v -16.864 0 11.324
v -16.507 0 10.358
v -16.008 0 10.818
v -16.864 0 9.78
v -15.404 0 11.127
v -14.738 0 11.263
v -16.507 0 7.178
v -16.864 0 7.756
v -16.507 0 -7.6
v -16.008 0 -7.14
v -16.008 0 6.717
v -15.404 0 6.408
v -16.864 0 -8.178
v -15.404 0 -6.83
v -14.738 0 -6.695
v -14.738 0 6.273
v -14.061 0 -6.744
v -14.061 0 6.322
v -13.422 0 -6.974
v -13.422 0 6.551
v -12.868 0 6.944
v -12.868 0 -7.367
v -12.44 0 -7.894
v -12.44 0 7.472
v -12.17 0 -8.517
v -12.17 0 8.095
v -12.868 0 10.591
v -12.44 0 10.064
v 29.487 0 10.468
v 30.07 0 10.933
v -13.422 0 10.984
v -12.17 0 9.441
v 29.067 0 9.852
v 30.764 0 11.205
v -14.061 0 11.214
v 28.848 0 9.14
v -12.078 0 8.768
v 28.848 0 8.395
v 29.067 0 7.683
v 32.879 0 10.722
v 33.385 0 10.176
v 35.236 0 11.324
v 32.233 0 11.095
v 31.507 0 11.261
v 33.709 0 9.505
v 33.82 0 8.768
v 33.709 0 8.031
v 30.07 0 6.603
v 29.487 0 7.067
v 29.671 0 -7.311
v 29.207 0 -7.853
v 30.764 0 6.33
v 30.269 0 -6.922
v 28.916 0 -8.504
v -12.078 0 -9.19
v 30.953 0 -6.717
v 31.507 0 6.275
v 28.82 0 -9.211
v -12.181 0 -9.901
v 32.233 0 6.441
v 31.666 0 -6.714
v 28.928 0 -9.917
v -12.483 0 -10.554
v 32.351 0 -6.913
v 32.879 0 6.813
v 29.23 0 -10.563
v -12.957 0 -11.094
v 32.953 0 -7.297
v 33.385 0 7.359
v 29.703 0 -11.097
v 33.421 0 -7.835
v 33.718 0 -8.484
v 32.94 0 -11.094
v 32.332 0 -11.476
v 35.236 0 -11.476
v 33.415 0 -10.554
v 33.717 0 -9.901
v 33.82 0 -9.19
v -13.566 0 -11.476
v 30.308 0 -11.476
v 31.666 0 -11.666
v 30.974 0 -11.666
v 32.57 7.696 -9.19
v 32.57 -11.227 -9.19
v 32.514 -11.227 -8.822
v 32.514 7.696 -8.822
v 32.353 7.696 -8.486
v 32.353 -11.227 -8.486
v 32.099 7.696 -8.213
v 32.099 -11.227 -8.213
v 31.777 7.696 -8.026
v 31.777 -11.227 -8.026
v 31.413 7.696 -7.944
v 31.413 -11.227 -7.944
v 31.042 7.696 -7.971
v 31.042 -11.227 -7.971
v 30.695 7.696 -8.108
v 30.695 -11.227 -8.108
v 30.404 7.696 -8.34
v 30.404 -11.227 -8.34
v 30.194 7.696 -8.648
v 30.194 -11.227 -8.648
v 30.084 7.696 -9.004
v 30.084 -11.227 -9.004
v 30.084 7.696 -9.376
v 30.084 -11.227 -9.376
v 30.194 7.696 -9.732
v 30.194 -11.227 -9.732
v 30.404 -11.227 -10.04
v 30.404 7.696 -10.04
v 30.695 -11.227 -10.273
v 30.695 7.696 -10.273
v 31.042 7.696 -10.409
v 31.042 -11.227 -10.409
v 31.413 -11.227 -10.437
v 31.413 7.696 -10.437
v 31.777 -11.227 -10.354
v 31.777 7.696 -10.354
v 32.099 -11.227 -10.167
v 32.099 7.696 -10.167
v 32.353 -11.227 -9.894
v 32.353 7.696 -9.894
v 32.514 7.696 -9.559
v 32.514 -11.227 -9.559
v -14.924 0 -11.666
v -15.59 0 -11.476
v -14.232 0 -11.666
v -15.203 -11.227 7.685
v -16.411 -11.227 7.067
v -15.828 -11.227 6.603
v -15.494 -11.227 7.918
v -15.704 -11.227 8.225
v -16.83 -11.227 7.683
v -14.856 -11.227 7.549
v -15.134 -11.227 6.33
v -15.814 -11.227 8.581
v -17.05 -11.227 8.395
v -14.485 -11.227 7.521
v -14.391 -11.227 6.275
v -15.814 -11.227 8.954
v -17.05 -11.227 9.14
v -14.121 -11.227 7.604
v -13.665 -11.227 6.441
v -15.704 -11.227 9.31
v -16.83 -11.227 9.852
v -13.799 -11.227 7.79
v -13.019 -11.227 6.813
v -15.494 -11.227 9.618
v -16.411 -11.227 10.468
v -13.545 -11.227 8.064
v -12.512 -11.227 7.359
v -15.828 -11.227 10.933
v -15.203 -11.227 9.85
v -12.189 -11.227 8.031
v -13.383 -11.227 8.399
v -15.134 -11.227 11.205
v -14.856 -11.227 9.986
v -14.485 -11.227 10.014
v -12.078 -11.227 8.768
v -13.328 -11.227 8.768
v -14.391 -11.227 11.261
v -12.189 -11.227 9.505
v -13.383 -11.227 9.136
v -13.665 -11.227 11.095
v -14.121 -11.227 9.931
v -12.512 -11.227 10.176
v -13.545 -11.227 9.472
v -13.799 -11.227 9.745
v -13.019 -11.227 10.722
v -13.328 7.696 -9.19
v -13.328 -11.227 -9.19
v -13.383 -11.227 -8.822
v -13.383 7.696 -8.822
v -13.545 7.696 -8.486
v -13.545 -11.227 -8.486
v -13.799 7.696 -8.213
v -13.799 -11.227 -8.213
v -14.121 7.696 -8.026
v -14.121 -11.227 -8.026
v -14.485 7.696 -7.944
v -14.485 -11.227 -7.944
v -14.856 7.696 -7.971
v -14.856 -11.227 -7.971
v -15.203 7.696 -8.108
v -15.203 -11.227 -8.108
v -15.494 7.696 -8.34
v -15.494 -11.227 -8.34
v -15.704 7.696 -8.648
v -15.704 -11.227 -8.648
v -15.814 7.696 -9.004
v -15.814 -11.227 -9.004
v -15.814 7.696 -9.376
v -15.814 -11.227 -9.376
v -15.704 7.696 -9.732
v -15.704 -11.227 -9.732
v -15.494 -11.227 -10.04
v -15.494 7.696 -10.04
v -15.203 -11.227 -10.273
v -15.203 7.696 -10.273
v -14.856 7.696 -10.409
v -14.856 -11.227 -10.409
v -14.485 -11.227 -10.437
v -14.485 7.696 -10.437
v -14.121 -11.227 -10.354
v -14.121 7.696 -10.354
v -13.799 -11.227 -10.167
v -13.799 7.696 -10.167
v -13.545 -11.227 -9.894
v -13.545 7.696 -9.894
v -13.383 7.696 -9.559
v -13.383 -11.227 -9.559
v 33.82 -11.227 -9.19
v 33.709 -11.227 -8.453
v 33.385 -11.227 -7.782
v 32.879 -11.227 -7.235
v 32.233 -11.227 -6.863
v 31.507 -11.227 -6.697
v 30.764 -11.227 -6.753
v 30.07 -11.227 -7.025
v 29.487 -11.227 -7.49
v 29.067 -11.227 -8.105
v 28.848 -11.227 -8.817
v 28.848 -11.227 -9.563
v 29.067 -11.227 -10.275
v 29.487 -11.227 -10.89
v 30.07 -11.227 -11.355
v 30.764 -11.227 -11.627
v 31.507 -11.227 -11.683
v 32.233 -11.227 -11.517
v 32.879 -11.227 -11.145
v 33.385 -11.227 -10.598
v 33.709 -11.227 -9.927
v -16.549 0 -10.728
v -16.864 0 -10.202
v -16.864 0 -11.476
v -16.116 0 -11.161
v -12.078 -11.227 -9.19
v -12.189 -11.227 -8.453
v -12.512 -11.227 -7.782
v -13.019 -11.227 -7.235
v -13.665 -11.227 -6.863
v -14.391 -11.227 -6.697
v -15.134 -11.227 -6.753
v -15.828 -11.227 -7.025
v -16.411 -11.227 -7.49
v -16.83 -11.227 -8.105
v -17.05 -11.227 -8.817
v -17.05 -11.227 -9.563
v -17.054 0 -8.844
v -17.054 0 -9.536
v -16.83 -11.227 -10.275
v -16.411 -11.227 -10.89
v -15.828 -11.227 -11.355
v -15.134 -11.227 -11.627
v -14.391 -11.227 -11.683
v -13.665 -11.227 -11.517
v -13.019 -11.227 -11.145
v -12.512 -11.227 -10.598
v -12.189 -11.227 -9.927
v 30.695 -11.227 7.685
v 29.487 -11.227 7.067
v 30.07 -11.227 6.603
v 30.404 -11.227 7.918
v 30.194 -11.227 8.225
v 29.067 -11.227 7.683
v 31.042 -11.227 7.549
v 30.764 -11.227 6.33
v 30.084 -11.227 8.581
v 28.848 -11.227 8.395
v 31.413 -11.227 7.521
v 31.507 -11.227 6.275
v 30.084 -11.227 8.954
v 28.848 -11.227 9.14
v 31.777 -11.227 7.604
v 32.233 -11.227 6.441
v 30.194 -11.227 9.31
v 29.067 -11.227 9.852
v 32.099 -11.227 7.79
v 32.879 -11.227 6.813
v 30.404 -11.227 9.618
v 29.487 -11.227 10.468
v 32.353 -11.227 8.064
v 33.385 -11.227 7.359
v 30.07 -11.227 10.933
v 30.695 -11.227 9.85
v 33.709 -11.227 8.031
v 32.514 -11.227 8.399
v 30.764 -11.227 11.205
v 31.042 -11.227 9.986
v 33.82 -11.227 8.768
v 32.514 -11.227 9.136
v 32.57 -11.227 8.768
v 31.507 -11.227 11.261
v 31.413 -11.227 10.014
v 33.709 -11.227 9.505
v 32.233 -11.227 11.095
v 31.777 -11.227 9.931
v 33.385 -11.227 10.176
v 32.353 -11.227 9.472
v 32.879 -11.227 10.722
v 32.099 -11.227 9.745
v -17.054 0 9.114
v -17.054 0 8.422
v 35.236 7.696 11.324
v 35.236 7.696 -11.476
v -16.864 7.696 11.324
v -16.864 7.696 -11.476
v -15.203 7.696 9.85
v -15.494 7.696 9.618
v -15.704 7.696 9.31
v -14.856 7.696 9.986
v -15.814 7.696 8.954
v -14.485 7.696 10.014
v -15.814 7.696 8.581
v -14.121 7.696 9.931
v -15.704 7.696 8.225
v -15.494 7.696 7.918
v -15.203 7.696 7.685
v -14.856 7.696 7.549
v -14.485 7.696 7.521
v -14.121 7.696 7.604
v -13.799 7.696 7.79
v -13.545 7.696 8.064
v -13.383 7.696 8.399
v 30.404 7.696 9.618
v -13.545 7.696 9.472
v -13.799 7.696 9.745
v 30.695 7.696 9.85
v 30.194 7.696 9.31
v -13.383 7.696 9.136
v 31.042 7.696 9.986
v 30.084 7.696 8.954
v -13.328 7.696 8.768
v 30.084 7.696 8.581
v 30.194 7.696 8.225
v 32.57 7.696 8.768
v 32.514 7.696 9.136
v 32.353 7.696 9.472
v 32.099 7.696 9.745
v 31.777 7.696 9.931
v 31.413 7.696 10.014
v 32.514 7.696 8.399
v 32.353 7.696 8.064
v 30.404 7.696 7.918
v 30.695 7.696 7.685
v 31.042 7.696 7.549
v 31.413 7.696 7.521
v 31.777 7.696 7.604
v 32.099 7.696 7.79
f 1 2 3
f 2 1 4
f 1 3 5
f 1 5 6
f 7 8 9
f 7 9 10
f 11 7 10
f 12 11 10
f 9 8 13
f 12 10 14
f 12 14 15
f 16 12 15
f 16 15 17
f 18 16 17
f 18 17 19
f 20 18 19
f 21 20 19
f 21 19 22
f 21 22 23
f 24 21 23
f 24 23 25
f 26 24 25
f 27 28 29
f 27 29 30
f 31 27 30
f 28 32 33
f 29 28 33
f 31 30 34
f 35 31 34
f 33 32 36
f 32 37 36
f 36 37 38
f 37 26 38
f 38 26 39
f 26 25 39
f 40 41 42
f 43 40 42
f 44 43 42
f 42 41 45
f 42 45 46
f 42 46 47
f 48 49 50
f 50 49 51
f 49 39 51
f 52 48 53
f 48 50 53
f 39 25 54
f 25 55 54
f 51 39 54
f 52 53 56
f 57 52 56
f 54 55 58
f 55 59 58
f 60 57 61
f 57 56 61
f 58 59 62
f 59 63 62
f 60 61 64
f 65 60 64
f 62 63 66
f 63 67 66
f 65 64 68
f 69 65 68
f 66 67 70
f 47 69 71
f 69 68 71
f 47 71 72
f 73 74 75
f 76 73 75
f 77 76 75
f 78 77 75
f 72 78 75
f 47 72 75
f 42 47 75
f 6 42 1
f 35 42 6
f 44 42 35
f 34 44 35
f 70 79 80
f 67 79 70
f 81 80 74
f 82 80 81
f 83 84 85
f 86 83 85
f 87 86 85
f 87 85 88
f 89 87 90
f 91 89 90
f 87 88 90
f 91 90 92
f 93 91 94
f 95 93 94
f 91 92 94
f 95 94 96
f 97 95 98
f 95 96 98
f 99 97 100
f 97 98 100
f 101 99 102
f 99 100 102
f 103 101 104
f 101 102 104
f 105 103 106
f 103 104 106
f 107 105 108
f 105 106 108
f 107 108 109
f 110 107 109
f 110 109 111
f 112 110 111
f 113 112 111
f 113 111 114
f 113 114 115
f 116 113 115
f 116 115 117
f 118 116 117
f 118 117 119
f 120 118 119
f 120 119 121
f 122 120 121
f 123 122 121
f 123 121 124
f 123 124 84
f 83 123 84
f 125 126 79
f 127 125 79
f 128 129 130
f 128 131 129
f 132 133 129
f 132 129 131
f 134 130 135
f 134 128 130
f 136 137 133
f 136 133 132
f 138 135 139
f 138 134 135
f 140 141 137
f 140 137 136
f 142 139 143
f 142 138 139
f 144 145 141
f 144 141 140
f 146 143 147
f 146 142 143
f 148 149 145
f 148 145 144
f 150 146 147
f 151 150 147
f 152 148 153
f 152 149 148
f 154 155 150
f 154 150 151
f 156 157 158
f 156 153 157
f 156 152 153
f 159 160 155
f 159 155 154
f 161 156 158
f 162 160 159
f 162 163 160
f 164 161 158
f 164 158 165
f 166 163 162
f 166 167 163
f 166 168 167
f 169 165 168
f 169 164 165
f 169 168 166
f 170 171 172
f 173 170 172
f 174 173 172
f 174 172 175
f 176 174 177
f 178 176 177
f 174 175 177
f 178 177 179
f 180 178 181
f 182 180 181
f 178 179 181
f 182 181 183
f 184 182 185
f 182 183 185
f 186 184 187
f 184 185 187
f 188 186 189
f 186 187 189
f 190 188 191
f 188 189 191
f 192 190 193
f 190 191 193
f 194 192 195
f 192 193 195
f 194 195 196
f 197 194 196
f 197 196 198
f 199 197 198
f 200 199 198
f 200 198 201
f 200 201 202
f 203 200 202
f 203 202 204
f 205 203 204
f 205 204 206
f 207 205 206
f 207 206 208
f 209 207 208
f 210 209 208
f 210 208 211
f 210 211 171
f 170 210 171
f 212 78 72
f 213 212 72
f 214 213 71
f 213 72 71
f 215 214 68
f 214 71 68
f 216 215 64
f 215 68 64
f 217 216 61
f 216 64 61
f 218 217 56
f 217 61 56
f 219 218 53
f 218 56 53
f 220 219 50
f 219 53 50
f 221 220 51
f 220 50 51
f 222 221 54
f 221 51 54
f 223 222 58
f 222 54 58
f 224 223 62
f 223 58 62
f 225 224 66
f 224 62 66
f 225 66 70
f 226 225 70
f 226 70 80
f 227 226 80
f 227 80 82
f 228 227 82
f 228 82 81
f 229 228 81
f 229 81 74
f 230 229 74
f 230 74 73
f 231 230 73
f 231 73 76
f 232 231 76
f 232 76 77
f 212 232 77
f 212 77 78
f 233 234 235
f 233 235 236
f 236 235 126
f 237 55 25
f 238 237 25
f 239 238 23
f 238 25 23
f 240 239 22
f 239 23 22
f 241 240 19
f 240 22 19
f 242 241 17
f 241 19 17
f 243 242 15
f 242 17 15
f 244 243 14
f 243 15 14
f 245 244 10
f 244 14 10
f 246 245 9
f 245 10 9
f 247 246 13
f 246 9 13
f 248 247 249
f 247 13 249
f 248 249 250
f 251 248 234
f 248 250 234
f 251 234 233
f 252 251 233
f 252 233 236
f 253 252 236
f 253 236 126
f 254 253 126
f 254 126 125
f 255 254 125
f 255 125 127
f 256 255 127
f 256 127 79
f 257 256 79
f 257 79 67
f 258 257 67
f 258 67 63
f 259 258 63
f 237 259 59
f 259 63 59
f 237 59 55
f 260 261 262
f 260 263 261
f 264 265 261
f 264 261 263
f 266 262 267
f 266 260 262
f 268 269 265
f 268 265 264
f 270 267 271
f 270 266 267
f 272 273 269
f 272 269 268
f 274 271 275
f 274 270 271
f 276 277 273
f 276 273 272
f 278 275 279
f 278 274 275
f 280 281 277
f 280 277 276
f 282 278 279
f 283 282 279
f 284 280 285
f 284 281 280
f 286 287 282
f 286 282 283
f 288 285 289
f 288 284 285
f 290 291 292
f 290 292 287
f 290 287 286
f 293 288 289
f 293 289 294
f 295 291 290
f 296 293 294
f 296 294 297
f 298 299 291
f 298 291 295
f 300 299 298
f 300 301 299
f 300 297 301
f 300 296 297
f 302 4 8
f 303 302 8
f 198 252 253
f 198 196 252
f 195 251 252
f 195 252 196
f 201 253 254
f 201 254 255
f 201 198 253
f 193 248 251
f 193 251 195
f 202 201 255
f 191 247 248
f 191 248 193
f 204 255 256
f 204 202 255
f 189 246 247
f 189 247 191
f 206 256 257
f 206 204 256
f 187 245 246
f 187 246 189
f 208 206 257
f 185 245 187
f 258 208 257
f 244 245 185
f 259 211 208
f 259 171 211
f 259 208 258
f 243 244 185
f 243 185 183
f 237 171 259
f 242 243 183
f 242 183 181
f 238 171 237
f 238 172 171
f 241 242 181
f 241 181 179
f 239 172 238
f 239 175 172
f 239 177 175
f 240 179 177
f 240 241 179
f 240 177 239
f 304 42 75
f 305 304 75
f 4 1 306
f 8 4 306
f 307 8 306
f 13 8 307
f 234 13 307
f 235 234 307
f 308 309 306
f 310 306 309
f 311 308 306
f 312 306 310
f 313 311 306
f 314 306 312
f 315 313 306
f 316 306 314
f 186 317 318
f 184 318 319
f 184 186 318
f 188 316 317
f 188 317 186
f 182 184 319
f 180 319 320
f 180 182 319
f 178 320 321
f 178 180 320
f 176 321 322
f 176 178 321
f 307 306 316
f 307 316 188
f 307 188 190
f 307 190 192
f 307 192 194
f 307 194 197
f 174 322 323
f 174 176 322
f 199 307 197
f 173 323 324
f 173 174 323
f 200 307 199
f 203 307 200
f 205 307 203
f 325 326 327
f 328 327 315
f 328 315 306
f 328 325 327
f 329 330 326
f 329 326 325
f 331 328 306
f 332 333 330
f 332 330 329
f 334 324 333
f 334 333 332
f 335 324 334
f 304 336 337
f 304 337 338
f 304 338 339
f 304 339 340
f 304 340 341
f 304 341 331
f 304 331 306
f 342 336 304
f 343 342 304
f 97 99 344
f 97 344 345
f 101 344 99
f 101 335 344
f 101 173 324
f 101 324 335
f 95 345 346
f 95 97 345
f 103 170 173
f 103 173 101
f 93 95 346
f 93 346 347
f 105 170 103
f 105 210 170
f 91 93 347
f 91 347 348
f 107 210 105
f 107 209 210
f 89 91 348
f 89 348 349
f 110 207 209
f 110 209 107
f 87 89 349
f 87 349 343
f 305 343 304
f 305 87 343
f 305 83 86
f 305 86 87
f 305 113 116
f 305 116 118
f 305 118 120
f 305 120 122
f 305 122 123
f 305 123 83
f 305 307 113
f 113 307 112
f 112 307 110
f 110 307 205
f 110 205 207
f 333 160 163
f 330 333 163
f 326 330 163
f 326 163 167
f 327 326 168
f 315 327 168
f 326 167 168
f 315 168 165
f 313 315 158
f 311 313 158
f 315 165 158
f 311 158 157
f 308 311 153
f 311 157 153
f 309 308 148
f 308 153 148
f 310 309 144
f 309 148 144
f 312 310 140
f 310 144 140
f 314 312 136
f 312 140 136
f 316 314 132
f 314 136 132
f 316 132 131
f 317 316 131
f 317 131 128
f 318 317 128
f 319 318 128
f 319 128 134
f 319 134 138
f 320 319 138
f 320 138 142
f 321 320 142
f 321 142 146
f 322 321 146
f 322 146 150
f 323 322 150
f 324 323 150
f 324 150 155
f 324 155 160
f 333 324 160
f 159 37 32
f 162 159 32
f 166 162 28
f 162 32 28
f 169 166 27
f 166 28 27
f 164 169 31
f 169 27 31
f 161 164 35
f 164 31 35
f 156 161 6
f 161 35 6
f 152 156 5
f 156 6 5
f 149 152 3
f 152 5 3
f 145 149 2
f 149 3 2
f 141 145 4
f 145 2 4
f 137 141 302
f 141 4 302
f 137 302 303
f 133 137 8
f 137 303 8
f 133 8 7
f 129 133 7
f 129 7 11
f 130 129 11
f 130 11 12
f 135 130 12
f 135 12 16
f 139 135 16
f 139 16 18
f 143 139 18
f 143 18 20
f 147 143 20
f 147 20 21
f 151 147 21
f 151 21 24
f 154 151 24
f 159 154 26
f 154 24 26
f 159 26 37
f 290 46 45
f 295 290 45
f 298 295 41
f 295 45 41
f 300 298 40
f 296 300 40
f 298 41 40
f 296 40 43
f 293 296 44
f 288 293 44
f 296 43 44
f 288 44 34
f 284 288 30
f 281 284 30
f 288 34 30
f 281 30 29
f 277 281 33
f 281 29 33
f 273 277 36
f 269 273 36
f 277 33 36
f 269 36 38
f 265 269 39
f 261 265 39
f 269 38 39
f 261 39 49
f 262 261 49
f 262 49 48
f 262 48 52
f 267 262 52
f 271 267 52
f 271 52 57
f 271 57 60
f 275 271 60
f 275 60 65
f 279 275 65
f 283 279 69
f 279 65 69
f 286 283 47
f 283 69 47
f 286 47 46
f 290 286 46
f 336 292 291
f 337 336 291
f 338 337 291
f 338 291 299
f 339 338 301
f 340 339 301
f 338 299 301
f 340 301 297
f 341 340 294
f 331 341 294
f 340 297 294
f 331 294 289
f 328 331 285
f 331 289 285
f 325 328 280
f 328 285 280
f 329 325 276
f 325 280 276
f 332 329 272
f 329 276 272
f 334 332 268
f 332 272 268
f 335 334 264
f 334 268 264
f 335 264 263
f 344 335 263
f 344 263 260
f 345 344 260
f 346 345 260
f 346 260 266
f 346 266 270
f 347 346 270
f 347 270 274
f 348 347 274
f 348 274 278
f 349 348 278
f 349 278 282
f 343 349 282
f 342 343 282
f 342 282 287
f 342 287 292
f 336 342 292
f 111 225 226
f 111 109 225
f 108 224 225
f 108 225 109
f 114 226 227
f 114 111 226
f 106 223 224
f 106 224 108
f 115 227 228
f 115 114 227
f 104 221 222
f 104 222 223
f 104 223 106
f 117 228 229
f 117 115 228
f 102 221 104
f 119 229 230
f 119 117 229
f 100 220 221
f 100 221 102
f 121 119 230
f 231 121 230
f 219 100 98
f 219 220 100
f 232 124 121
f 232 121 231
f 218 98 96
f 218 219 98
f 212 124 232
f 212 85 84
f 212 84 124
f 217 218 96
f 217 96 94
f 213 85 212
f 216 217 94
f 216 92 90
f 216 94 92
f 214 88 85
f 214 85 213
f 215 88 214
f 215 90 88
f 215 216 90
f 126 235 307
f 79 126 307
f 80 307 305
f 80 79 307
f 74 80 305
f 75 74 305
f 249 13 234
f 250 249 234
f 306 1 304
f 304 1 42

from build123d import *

# Parameters (mm, degrees)
SKETCH1_W           = 52.1
SKETCH1_H           = 22.8
BOSS_EXTRUDE1_DEPTH = 7.6962
SKETCH2_R           = 2.5
BOSS_EXTRUDE2_DEPTH = 11.2268
SKETCH3_R           = 1.25
CUT_EXTRUDE1_DEPTH  = 19.923


with BuildPart() as part:
    # Sketch1 → Boss-Extrude1 (new body)
    with BuildSketch(Plane(origin=(0, 0, 0), x_dir=(1, 0, 0), z_dir=(0, 1, 0))):
        with Locations((9.186055138, 0.076057393)):
            Rectangle(SKETCH1_W, SKETCH1_H)
    extrude(amount=BOSS_EXTRUDE1_DEPTH)

    # Sketch2 → Boss-Extrude2 (add)
    with BuildSketch(Plane.XZ):
        with Locations((-14.577944862, 8.767742607)):
            Circle(SKETCH2_R)
        with Locations((31.319855138, 8.767742607)):
            Circle(SKETCH2_R)
        with Locations((31.319855138, -9.190057393)):
            Circle(SKETCH2_R)
        with Locations((-14.577944862, -9.190057393)):
            Circle(SKETCH2_R)
    extrude(amount=BOSS_EXTRUDE2_DEPTH)

    # Sketch3 → Cut-Extrude1 (cut, through all)
    with BuildSketch(Plane.XZ.offset(11.2268)):
        with Locations((-14.577944862, 8.767742607)):
            Circle(SKETCH3_R)
        with Locations((-14.577944862, -9.190057393)):
            Circle(SKETCH3_R)
        with Locations((31.319855138, -9.190057393)):
            Circle(SKETCH3_R)
        with Locations((31.319855138, 8.767742607)):
            Circle(SKETCH3_R)
    extrude(amount=-CUT_EXTRUDE1_DEPTH, mode=Mode.SUBTRACT)


solid = part.part
